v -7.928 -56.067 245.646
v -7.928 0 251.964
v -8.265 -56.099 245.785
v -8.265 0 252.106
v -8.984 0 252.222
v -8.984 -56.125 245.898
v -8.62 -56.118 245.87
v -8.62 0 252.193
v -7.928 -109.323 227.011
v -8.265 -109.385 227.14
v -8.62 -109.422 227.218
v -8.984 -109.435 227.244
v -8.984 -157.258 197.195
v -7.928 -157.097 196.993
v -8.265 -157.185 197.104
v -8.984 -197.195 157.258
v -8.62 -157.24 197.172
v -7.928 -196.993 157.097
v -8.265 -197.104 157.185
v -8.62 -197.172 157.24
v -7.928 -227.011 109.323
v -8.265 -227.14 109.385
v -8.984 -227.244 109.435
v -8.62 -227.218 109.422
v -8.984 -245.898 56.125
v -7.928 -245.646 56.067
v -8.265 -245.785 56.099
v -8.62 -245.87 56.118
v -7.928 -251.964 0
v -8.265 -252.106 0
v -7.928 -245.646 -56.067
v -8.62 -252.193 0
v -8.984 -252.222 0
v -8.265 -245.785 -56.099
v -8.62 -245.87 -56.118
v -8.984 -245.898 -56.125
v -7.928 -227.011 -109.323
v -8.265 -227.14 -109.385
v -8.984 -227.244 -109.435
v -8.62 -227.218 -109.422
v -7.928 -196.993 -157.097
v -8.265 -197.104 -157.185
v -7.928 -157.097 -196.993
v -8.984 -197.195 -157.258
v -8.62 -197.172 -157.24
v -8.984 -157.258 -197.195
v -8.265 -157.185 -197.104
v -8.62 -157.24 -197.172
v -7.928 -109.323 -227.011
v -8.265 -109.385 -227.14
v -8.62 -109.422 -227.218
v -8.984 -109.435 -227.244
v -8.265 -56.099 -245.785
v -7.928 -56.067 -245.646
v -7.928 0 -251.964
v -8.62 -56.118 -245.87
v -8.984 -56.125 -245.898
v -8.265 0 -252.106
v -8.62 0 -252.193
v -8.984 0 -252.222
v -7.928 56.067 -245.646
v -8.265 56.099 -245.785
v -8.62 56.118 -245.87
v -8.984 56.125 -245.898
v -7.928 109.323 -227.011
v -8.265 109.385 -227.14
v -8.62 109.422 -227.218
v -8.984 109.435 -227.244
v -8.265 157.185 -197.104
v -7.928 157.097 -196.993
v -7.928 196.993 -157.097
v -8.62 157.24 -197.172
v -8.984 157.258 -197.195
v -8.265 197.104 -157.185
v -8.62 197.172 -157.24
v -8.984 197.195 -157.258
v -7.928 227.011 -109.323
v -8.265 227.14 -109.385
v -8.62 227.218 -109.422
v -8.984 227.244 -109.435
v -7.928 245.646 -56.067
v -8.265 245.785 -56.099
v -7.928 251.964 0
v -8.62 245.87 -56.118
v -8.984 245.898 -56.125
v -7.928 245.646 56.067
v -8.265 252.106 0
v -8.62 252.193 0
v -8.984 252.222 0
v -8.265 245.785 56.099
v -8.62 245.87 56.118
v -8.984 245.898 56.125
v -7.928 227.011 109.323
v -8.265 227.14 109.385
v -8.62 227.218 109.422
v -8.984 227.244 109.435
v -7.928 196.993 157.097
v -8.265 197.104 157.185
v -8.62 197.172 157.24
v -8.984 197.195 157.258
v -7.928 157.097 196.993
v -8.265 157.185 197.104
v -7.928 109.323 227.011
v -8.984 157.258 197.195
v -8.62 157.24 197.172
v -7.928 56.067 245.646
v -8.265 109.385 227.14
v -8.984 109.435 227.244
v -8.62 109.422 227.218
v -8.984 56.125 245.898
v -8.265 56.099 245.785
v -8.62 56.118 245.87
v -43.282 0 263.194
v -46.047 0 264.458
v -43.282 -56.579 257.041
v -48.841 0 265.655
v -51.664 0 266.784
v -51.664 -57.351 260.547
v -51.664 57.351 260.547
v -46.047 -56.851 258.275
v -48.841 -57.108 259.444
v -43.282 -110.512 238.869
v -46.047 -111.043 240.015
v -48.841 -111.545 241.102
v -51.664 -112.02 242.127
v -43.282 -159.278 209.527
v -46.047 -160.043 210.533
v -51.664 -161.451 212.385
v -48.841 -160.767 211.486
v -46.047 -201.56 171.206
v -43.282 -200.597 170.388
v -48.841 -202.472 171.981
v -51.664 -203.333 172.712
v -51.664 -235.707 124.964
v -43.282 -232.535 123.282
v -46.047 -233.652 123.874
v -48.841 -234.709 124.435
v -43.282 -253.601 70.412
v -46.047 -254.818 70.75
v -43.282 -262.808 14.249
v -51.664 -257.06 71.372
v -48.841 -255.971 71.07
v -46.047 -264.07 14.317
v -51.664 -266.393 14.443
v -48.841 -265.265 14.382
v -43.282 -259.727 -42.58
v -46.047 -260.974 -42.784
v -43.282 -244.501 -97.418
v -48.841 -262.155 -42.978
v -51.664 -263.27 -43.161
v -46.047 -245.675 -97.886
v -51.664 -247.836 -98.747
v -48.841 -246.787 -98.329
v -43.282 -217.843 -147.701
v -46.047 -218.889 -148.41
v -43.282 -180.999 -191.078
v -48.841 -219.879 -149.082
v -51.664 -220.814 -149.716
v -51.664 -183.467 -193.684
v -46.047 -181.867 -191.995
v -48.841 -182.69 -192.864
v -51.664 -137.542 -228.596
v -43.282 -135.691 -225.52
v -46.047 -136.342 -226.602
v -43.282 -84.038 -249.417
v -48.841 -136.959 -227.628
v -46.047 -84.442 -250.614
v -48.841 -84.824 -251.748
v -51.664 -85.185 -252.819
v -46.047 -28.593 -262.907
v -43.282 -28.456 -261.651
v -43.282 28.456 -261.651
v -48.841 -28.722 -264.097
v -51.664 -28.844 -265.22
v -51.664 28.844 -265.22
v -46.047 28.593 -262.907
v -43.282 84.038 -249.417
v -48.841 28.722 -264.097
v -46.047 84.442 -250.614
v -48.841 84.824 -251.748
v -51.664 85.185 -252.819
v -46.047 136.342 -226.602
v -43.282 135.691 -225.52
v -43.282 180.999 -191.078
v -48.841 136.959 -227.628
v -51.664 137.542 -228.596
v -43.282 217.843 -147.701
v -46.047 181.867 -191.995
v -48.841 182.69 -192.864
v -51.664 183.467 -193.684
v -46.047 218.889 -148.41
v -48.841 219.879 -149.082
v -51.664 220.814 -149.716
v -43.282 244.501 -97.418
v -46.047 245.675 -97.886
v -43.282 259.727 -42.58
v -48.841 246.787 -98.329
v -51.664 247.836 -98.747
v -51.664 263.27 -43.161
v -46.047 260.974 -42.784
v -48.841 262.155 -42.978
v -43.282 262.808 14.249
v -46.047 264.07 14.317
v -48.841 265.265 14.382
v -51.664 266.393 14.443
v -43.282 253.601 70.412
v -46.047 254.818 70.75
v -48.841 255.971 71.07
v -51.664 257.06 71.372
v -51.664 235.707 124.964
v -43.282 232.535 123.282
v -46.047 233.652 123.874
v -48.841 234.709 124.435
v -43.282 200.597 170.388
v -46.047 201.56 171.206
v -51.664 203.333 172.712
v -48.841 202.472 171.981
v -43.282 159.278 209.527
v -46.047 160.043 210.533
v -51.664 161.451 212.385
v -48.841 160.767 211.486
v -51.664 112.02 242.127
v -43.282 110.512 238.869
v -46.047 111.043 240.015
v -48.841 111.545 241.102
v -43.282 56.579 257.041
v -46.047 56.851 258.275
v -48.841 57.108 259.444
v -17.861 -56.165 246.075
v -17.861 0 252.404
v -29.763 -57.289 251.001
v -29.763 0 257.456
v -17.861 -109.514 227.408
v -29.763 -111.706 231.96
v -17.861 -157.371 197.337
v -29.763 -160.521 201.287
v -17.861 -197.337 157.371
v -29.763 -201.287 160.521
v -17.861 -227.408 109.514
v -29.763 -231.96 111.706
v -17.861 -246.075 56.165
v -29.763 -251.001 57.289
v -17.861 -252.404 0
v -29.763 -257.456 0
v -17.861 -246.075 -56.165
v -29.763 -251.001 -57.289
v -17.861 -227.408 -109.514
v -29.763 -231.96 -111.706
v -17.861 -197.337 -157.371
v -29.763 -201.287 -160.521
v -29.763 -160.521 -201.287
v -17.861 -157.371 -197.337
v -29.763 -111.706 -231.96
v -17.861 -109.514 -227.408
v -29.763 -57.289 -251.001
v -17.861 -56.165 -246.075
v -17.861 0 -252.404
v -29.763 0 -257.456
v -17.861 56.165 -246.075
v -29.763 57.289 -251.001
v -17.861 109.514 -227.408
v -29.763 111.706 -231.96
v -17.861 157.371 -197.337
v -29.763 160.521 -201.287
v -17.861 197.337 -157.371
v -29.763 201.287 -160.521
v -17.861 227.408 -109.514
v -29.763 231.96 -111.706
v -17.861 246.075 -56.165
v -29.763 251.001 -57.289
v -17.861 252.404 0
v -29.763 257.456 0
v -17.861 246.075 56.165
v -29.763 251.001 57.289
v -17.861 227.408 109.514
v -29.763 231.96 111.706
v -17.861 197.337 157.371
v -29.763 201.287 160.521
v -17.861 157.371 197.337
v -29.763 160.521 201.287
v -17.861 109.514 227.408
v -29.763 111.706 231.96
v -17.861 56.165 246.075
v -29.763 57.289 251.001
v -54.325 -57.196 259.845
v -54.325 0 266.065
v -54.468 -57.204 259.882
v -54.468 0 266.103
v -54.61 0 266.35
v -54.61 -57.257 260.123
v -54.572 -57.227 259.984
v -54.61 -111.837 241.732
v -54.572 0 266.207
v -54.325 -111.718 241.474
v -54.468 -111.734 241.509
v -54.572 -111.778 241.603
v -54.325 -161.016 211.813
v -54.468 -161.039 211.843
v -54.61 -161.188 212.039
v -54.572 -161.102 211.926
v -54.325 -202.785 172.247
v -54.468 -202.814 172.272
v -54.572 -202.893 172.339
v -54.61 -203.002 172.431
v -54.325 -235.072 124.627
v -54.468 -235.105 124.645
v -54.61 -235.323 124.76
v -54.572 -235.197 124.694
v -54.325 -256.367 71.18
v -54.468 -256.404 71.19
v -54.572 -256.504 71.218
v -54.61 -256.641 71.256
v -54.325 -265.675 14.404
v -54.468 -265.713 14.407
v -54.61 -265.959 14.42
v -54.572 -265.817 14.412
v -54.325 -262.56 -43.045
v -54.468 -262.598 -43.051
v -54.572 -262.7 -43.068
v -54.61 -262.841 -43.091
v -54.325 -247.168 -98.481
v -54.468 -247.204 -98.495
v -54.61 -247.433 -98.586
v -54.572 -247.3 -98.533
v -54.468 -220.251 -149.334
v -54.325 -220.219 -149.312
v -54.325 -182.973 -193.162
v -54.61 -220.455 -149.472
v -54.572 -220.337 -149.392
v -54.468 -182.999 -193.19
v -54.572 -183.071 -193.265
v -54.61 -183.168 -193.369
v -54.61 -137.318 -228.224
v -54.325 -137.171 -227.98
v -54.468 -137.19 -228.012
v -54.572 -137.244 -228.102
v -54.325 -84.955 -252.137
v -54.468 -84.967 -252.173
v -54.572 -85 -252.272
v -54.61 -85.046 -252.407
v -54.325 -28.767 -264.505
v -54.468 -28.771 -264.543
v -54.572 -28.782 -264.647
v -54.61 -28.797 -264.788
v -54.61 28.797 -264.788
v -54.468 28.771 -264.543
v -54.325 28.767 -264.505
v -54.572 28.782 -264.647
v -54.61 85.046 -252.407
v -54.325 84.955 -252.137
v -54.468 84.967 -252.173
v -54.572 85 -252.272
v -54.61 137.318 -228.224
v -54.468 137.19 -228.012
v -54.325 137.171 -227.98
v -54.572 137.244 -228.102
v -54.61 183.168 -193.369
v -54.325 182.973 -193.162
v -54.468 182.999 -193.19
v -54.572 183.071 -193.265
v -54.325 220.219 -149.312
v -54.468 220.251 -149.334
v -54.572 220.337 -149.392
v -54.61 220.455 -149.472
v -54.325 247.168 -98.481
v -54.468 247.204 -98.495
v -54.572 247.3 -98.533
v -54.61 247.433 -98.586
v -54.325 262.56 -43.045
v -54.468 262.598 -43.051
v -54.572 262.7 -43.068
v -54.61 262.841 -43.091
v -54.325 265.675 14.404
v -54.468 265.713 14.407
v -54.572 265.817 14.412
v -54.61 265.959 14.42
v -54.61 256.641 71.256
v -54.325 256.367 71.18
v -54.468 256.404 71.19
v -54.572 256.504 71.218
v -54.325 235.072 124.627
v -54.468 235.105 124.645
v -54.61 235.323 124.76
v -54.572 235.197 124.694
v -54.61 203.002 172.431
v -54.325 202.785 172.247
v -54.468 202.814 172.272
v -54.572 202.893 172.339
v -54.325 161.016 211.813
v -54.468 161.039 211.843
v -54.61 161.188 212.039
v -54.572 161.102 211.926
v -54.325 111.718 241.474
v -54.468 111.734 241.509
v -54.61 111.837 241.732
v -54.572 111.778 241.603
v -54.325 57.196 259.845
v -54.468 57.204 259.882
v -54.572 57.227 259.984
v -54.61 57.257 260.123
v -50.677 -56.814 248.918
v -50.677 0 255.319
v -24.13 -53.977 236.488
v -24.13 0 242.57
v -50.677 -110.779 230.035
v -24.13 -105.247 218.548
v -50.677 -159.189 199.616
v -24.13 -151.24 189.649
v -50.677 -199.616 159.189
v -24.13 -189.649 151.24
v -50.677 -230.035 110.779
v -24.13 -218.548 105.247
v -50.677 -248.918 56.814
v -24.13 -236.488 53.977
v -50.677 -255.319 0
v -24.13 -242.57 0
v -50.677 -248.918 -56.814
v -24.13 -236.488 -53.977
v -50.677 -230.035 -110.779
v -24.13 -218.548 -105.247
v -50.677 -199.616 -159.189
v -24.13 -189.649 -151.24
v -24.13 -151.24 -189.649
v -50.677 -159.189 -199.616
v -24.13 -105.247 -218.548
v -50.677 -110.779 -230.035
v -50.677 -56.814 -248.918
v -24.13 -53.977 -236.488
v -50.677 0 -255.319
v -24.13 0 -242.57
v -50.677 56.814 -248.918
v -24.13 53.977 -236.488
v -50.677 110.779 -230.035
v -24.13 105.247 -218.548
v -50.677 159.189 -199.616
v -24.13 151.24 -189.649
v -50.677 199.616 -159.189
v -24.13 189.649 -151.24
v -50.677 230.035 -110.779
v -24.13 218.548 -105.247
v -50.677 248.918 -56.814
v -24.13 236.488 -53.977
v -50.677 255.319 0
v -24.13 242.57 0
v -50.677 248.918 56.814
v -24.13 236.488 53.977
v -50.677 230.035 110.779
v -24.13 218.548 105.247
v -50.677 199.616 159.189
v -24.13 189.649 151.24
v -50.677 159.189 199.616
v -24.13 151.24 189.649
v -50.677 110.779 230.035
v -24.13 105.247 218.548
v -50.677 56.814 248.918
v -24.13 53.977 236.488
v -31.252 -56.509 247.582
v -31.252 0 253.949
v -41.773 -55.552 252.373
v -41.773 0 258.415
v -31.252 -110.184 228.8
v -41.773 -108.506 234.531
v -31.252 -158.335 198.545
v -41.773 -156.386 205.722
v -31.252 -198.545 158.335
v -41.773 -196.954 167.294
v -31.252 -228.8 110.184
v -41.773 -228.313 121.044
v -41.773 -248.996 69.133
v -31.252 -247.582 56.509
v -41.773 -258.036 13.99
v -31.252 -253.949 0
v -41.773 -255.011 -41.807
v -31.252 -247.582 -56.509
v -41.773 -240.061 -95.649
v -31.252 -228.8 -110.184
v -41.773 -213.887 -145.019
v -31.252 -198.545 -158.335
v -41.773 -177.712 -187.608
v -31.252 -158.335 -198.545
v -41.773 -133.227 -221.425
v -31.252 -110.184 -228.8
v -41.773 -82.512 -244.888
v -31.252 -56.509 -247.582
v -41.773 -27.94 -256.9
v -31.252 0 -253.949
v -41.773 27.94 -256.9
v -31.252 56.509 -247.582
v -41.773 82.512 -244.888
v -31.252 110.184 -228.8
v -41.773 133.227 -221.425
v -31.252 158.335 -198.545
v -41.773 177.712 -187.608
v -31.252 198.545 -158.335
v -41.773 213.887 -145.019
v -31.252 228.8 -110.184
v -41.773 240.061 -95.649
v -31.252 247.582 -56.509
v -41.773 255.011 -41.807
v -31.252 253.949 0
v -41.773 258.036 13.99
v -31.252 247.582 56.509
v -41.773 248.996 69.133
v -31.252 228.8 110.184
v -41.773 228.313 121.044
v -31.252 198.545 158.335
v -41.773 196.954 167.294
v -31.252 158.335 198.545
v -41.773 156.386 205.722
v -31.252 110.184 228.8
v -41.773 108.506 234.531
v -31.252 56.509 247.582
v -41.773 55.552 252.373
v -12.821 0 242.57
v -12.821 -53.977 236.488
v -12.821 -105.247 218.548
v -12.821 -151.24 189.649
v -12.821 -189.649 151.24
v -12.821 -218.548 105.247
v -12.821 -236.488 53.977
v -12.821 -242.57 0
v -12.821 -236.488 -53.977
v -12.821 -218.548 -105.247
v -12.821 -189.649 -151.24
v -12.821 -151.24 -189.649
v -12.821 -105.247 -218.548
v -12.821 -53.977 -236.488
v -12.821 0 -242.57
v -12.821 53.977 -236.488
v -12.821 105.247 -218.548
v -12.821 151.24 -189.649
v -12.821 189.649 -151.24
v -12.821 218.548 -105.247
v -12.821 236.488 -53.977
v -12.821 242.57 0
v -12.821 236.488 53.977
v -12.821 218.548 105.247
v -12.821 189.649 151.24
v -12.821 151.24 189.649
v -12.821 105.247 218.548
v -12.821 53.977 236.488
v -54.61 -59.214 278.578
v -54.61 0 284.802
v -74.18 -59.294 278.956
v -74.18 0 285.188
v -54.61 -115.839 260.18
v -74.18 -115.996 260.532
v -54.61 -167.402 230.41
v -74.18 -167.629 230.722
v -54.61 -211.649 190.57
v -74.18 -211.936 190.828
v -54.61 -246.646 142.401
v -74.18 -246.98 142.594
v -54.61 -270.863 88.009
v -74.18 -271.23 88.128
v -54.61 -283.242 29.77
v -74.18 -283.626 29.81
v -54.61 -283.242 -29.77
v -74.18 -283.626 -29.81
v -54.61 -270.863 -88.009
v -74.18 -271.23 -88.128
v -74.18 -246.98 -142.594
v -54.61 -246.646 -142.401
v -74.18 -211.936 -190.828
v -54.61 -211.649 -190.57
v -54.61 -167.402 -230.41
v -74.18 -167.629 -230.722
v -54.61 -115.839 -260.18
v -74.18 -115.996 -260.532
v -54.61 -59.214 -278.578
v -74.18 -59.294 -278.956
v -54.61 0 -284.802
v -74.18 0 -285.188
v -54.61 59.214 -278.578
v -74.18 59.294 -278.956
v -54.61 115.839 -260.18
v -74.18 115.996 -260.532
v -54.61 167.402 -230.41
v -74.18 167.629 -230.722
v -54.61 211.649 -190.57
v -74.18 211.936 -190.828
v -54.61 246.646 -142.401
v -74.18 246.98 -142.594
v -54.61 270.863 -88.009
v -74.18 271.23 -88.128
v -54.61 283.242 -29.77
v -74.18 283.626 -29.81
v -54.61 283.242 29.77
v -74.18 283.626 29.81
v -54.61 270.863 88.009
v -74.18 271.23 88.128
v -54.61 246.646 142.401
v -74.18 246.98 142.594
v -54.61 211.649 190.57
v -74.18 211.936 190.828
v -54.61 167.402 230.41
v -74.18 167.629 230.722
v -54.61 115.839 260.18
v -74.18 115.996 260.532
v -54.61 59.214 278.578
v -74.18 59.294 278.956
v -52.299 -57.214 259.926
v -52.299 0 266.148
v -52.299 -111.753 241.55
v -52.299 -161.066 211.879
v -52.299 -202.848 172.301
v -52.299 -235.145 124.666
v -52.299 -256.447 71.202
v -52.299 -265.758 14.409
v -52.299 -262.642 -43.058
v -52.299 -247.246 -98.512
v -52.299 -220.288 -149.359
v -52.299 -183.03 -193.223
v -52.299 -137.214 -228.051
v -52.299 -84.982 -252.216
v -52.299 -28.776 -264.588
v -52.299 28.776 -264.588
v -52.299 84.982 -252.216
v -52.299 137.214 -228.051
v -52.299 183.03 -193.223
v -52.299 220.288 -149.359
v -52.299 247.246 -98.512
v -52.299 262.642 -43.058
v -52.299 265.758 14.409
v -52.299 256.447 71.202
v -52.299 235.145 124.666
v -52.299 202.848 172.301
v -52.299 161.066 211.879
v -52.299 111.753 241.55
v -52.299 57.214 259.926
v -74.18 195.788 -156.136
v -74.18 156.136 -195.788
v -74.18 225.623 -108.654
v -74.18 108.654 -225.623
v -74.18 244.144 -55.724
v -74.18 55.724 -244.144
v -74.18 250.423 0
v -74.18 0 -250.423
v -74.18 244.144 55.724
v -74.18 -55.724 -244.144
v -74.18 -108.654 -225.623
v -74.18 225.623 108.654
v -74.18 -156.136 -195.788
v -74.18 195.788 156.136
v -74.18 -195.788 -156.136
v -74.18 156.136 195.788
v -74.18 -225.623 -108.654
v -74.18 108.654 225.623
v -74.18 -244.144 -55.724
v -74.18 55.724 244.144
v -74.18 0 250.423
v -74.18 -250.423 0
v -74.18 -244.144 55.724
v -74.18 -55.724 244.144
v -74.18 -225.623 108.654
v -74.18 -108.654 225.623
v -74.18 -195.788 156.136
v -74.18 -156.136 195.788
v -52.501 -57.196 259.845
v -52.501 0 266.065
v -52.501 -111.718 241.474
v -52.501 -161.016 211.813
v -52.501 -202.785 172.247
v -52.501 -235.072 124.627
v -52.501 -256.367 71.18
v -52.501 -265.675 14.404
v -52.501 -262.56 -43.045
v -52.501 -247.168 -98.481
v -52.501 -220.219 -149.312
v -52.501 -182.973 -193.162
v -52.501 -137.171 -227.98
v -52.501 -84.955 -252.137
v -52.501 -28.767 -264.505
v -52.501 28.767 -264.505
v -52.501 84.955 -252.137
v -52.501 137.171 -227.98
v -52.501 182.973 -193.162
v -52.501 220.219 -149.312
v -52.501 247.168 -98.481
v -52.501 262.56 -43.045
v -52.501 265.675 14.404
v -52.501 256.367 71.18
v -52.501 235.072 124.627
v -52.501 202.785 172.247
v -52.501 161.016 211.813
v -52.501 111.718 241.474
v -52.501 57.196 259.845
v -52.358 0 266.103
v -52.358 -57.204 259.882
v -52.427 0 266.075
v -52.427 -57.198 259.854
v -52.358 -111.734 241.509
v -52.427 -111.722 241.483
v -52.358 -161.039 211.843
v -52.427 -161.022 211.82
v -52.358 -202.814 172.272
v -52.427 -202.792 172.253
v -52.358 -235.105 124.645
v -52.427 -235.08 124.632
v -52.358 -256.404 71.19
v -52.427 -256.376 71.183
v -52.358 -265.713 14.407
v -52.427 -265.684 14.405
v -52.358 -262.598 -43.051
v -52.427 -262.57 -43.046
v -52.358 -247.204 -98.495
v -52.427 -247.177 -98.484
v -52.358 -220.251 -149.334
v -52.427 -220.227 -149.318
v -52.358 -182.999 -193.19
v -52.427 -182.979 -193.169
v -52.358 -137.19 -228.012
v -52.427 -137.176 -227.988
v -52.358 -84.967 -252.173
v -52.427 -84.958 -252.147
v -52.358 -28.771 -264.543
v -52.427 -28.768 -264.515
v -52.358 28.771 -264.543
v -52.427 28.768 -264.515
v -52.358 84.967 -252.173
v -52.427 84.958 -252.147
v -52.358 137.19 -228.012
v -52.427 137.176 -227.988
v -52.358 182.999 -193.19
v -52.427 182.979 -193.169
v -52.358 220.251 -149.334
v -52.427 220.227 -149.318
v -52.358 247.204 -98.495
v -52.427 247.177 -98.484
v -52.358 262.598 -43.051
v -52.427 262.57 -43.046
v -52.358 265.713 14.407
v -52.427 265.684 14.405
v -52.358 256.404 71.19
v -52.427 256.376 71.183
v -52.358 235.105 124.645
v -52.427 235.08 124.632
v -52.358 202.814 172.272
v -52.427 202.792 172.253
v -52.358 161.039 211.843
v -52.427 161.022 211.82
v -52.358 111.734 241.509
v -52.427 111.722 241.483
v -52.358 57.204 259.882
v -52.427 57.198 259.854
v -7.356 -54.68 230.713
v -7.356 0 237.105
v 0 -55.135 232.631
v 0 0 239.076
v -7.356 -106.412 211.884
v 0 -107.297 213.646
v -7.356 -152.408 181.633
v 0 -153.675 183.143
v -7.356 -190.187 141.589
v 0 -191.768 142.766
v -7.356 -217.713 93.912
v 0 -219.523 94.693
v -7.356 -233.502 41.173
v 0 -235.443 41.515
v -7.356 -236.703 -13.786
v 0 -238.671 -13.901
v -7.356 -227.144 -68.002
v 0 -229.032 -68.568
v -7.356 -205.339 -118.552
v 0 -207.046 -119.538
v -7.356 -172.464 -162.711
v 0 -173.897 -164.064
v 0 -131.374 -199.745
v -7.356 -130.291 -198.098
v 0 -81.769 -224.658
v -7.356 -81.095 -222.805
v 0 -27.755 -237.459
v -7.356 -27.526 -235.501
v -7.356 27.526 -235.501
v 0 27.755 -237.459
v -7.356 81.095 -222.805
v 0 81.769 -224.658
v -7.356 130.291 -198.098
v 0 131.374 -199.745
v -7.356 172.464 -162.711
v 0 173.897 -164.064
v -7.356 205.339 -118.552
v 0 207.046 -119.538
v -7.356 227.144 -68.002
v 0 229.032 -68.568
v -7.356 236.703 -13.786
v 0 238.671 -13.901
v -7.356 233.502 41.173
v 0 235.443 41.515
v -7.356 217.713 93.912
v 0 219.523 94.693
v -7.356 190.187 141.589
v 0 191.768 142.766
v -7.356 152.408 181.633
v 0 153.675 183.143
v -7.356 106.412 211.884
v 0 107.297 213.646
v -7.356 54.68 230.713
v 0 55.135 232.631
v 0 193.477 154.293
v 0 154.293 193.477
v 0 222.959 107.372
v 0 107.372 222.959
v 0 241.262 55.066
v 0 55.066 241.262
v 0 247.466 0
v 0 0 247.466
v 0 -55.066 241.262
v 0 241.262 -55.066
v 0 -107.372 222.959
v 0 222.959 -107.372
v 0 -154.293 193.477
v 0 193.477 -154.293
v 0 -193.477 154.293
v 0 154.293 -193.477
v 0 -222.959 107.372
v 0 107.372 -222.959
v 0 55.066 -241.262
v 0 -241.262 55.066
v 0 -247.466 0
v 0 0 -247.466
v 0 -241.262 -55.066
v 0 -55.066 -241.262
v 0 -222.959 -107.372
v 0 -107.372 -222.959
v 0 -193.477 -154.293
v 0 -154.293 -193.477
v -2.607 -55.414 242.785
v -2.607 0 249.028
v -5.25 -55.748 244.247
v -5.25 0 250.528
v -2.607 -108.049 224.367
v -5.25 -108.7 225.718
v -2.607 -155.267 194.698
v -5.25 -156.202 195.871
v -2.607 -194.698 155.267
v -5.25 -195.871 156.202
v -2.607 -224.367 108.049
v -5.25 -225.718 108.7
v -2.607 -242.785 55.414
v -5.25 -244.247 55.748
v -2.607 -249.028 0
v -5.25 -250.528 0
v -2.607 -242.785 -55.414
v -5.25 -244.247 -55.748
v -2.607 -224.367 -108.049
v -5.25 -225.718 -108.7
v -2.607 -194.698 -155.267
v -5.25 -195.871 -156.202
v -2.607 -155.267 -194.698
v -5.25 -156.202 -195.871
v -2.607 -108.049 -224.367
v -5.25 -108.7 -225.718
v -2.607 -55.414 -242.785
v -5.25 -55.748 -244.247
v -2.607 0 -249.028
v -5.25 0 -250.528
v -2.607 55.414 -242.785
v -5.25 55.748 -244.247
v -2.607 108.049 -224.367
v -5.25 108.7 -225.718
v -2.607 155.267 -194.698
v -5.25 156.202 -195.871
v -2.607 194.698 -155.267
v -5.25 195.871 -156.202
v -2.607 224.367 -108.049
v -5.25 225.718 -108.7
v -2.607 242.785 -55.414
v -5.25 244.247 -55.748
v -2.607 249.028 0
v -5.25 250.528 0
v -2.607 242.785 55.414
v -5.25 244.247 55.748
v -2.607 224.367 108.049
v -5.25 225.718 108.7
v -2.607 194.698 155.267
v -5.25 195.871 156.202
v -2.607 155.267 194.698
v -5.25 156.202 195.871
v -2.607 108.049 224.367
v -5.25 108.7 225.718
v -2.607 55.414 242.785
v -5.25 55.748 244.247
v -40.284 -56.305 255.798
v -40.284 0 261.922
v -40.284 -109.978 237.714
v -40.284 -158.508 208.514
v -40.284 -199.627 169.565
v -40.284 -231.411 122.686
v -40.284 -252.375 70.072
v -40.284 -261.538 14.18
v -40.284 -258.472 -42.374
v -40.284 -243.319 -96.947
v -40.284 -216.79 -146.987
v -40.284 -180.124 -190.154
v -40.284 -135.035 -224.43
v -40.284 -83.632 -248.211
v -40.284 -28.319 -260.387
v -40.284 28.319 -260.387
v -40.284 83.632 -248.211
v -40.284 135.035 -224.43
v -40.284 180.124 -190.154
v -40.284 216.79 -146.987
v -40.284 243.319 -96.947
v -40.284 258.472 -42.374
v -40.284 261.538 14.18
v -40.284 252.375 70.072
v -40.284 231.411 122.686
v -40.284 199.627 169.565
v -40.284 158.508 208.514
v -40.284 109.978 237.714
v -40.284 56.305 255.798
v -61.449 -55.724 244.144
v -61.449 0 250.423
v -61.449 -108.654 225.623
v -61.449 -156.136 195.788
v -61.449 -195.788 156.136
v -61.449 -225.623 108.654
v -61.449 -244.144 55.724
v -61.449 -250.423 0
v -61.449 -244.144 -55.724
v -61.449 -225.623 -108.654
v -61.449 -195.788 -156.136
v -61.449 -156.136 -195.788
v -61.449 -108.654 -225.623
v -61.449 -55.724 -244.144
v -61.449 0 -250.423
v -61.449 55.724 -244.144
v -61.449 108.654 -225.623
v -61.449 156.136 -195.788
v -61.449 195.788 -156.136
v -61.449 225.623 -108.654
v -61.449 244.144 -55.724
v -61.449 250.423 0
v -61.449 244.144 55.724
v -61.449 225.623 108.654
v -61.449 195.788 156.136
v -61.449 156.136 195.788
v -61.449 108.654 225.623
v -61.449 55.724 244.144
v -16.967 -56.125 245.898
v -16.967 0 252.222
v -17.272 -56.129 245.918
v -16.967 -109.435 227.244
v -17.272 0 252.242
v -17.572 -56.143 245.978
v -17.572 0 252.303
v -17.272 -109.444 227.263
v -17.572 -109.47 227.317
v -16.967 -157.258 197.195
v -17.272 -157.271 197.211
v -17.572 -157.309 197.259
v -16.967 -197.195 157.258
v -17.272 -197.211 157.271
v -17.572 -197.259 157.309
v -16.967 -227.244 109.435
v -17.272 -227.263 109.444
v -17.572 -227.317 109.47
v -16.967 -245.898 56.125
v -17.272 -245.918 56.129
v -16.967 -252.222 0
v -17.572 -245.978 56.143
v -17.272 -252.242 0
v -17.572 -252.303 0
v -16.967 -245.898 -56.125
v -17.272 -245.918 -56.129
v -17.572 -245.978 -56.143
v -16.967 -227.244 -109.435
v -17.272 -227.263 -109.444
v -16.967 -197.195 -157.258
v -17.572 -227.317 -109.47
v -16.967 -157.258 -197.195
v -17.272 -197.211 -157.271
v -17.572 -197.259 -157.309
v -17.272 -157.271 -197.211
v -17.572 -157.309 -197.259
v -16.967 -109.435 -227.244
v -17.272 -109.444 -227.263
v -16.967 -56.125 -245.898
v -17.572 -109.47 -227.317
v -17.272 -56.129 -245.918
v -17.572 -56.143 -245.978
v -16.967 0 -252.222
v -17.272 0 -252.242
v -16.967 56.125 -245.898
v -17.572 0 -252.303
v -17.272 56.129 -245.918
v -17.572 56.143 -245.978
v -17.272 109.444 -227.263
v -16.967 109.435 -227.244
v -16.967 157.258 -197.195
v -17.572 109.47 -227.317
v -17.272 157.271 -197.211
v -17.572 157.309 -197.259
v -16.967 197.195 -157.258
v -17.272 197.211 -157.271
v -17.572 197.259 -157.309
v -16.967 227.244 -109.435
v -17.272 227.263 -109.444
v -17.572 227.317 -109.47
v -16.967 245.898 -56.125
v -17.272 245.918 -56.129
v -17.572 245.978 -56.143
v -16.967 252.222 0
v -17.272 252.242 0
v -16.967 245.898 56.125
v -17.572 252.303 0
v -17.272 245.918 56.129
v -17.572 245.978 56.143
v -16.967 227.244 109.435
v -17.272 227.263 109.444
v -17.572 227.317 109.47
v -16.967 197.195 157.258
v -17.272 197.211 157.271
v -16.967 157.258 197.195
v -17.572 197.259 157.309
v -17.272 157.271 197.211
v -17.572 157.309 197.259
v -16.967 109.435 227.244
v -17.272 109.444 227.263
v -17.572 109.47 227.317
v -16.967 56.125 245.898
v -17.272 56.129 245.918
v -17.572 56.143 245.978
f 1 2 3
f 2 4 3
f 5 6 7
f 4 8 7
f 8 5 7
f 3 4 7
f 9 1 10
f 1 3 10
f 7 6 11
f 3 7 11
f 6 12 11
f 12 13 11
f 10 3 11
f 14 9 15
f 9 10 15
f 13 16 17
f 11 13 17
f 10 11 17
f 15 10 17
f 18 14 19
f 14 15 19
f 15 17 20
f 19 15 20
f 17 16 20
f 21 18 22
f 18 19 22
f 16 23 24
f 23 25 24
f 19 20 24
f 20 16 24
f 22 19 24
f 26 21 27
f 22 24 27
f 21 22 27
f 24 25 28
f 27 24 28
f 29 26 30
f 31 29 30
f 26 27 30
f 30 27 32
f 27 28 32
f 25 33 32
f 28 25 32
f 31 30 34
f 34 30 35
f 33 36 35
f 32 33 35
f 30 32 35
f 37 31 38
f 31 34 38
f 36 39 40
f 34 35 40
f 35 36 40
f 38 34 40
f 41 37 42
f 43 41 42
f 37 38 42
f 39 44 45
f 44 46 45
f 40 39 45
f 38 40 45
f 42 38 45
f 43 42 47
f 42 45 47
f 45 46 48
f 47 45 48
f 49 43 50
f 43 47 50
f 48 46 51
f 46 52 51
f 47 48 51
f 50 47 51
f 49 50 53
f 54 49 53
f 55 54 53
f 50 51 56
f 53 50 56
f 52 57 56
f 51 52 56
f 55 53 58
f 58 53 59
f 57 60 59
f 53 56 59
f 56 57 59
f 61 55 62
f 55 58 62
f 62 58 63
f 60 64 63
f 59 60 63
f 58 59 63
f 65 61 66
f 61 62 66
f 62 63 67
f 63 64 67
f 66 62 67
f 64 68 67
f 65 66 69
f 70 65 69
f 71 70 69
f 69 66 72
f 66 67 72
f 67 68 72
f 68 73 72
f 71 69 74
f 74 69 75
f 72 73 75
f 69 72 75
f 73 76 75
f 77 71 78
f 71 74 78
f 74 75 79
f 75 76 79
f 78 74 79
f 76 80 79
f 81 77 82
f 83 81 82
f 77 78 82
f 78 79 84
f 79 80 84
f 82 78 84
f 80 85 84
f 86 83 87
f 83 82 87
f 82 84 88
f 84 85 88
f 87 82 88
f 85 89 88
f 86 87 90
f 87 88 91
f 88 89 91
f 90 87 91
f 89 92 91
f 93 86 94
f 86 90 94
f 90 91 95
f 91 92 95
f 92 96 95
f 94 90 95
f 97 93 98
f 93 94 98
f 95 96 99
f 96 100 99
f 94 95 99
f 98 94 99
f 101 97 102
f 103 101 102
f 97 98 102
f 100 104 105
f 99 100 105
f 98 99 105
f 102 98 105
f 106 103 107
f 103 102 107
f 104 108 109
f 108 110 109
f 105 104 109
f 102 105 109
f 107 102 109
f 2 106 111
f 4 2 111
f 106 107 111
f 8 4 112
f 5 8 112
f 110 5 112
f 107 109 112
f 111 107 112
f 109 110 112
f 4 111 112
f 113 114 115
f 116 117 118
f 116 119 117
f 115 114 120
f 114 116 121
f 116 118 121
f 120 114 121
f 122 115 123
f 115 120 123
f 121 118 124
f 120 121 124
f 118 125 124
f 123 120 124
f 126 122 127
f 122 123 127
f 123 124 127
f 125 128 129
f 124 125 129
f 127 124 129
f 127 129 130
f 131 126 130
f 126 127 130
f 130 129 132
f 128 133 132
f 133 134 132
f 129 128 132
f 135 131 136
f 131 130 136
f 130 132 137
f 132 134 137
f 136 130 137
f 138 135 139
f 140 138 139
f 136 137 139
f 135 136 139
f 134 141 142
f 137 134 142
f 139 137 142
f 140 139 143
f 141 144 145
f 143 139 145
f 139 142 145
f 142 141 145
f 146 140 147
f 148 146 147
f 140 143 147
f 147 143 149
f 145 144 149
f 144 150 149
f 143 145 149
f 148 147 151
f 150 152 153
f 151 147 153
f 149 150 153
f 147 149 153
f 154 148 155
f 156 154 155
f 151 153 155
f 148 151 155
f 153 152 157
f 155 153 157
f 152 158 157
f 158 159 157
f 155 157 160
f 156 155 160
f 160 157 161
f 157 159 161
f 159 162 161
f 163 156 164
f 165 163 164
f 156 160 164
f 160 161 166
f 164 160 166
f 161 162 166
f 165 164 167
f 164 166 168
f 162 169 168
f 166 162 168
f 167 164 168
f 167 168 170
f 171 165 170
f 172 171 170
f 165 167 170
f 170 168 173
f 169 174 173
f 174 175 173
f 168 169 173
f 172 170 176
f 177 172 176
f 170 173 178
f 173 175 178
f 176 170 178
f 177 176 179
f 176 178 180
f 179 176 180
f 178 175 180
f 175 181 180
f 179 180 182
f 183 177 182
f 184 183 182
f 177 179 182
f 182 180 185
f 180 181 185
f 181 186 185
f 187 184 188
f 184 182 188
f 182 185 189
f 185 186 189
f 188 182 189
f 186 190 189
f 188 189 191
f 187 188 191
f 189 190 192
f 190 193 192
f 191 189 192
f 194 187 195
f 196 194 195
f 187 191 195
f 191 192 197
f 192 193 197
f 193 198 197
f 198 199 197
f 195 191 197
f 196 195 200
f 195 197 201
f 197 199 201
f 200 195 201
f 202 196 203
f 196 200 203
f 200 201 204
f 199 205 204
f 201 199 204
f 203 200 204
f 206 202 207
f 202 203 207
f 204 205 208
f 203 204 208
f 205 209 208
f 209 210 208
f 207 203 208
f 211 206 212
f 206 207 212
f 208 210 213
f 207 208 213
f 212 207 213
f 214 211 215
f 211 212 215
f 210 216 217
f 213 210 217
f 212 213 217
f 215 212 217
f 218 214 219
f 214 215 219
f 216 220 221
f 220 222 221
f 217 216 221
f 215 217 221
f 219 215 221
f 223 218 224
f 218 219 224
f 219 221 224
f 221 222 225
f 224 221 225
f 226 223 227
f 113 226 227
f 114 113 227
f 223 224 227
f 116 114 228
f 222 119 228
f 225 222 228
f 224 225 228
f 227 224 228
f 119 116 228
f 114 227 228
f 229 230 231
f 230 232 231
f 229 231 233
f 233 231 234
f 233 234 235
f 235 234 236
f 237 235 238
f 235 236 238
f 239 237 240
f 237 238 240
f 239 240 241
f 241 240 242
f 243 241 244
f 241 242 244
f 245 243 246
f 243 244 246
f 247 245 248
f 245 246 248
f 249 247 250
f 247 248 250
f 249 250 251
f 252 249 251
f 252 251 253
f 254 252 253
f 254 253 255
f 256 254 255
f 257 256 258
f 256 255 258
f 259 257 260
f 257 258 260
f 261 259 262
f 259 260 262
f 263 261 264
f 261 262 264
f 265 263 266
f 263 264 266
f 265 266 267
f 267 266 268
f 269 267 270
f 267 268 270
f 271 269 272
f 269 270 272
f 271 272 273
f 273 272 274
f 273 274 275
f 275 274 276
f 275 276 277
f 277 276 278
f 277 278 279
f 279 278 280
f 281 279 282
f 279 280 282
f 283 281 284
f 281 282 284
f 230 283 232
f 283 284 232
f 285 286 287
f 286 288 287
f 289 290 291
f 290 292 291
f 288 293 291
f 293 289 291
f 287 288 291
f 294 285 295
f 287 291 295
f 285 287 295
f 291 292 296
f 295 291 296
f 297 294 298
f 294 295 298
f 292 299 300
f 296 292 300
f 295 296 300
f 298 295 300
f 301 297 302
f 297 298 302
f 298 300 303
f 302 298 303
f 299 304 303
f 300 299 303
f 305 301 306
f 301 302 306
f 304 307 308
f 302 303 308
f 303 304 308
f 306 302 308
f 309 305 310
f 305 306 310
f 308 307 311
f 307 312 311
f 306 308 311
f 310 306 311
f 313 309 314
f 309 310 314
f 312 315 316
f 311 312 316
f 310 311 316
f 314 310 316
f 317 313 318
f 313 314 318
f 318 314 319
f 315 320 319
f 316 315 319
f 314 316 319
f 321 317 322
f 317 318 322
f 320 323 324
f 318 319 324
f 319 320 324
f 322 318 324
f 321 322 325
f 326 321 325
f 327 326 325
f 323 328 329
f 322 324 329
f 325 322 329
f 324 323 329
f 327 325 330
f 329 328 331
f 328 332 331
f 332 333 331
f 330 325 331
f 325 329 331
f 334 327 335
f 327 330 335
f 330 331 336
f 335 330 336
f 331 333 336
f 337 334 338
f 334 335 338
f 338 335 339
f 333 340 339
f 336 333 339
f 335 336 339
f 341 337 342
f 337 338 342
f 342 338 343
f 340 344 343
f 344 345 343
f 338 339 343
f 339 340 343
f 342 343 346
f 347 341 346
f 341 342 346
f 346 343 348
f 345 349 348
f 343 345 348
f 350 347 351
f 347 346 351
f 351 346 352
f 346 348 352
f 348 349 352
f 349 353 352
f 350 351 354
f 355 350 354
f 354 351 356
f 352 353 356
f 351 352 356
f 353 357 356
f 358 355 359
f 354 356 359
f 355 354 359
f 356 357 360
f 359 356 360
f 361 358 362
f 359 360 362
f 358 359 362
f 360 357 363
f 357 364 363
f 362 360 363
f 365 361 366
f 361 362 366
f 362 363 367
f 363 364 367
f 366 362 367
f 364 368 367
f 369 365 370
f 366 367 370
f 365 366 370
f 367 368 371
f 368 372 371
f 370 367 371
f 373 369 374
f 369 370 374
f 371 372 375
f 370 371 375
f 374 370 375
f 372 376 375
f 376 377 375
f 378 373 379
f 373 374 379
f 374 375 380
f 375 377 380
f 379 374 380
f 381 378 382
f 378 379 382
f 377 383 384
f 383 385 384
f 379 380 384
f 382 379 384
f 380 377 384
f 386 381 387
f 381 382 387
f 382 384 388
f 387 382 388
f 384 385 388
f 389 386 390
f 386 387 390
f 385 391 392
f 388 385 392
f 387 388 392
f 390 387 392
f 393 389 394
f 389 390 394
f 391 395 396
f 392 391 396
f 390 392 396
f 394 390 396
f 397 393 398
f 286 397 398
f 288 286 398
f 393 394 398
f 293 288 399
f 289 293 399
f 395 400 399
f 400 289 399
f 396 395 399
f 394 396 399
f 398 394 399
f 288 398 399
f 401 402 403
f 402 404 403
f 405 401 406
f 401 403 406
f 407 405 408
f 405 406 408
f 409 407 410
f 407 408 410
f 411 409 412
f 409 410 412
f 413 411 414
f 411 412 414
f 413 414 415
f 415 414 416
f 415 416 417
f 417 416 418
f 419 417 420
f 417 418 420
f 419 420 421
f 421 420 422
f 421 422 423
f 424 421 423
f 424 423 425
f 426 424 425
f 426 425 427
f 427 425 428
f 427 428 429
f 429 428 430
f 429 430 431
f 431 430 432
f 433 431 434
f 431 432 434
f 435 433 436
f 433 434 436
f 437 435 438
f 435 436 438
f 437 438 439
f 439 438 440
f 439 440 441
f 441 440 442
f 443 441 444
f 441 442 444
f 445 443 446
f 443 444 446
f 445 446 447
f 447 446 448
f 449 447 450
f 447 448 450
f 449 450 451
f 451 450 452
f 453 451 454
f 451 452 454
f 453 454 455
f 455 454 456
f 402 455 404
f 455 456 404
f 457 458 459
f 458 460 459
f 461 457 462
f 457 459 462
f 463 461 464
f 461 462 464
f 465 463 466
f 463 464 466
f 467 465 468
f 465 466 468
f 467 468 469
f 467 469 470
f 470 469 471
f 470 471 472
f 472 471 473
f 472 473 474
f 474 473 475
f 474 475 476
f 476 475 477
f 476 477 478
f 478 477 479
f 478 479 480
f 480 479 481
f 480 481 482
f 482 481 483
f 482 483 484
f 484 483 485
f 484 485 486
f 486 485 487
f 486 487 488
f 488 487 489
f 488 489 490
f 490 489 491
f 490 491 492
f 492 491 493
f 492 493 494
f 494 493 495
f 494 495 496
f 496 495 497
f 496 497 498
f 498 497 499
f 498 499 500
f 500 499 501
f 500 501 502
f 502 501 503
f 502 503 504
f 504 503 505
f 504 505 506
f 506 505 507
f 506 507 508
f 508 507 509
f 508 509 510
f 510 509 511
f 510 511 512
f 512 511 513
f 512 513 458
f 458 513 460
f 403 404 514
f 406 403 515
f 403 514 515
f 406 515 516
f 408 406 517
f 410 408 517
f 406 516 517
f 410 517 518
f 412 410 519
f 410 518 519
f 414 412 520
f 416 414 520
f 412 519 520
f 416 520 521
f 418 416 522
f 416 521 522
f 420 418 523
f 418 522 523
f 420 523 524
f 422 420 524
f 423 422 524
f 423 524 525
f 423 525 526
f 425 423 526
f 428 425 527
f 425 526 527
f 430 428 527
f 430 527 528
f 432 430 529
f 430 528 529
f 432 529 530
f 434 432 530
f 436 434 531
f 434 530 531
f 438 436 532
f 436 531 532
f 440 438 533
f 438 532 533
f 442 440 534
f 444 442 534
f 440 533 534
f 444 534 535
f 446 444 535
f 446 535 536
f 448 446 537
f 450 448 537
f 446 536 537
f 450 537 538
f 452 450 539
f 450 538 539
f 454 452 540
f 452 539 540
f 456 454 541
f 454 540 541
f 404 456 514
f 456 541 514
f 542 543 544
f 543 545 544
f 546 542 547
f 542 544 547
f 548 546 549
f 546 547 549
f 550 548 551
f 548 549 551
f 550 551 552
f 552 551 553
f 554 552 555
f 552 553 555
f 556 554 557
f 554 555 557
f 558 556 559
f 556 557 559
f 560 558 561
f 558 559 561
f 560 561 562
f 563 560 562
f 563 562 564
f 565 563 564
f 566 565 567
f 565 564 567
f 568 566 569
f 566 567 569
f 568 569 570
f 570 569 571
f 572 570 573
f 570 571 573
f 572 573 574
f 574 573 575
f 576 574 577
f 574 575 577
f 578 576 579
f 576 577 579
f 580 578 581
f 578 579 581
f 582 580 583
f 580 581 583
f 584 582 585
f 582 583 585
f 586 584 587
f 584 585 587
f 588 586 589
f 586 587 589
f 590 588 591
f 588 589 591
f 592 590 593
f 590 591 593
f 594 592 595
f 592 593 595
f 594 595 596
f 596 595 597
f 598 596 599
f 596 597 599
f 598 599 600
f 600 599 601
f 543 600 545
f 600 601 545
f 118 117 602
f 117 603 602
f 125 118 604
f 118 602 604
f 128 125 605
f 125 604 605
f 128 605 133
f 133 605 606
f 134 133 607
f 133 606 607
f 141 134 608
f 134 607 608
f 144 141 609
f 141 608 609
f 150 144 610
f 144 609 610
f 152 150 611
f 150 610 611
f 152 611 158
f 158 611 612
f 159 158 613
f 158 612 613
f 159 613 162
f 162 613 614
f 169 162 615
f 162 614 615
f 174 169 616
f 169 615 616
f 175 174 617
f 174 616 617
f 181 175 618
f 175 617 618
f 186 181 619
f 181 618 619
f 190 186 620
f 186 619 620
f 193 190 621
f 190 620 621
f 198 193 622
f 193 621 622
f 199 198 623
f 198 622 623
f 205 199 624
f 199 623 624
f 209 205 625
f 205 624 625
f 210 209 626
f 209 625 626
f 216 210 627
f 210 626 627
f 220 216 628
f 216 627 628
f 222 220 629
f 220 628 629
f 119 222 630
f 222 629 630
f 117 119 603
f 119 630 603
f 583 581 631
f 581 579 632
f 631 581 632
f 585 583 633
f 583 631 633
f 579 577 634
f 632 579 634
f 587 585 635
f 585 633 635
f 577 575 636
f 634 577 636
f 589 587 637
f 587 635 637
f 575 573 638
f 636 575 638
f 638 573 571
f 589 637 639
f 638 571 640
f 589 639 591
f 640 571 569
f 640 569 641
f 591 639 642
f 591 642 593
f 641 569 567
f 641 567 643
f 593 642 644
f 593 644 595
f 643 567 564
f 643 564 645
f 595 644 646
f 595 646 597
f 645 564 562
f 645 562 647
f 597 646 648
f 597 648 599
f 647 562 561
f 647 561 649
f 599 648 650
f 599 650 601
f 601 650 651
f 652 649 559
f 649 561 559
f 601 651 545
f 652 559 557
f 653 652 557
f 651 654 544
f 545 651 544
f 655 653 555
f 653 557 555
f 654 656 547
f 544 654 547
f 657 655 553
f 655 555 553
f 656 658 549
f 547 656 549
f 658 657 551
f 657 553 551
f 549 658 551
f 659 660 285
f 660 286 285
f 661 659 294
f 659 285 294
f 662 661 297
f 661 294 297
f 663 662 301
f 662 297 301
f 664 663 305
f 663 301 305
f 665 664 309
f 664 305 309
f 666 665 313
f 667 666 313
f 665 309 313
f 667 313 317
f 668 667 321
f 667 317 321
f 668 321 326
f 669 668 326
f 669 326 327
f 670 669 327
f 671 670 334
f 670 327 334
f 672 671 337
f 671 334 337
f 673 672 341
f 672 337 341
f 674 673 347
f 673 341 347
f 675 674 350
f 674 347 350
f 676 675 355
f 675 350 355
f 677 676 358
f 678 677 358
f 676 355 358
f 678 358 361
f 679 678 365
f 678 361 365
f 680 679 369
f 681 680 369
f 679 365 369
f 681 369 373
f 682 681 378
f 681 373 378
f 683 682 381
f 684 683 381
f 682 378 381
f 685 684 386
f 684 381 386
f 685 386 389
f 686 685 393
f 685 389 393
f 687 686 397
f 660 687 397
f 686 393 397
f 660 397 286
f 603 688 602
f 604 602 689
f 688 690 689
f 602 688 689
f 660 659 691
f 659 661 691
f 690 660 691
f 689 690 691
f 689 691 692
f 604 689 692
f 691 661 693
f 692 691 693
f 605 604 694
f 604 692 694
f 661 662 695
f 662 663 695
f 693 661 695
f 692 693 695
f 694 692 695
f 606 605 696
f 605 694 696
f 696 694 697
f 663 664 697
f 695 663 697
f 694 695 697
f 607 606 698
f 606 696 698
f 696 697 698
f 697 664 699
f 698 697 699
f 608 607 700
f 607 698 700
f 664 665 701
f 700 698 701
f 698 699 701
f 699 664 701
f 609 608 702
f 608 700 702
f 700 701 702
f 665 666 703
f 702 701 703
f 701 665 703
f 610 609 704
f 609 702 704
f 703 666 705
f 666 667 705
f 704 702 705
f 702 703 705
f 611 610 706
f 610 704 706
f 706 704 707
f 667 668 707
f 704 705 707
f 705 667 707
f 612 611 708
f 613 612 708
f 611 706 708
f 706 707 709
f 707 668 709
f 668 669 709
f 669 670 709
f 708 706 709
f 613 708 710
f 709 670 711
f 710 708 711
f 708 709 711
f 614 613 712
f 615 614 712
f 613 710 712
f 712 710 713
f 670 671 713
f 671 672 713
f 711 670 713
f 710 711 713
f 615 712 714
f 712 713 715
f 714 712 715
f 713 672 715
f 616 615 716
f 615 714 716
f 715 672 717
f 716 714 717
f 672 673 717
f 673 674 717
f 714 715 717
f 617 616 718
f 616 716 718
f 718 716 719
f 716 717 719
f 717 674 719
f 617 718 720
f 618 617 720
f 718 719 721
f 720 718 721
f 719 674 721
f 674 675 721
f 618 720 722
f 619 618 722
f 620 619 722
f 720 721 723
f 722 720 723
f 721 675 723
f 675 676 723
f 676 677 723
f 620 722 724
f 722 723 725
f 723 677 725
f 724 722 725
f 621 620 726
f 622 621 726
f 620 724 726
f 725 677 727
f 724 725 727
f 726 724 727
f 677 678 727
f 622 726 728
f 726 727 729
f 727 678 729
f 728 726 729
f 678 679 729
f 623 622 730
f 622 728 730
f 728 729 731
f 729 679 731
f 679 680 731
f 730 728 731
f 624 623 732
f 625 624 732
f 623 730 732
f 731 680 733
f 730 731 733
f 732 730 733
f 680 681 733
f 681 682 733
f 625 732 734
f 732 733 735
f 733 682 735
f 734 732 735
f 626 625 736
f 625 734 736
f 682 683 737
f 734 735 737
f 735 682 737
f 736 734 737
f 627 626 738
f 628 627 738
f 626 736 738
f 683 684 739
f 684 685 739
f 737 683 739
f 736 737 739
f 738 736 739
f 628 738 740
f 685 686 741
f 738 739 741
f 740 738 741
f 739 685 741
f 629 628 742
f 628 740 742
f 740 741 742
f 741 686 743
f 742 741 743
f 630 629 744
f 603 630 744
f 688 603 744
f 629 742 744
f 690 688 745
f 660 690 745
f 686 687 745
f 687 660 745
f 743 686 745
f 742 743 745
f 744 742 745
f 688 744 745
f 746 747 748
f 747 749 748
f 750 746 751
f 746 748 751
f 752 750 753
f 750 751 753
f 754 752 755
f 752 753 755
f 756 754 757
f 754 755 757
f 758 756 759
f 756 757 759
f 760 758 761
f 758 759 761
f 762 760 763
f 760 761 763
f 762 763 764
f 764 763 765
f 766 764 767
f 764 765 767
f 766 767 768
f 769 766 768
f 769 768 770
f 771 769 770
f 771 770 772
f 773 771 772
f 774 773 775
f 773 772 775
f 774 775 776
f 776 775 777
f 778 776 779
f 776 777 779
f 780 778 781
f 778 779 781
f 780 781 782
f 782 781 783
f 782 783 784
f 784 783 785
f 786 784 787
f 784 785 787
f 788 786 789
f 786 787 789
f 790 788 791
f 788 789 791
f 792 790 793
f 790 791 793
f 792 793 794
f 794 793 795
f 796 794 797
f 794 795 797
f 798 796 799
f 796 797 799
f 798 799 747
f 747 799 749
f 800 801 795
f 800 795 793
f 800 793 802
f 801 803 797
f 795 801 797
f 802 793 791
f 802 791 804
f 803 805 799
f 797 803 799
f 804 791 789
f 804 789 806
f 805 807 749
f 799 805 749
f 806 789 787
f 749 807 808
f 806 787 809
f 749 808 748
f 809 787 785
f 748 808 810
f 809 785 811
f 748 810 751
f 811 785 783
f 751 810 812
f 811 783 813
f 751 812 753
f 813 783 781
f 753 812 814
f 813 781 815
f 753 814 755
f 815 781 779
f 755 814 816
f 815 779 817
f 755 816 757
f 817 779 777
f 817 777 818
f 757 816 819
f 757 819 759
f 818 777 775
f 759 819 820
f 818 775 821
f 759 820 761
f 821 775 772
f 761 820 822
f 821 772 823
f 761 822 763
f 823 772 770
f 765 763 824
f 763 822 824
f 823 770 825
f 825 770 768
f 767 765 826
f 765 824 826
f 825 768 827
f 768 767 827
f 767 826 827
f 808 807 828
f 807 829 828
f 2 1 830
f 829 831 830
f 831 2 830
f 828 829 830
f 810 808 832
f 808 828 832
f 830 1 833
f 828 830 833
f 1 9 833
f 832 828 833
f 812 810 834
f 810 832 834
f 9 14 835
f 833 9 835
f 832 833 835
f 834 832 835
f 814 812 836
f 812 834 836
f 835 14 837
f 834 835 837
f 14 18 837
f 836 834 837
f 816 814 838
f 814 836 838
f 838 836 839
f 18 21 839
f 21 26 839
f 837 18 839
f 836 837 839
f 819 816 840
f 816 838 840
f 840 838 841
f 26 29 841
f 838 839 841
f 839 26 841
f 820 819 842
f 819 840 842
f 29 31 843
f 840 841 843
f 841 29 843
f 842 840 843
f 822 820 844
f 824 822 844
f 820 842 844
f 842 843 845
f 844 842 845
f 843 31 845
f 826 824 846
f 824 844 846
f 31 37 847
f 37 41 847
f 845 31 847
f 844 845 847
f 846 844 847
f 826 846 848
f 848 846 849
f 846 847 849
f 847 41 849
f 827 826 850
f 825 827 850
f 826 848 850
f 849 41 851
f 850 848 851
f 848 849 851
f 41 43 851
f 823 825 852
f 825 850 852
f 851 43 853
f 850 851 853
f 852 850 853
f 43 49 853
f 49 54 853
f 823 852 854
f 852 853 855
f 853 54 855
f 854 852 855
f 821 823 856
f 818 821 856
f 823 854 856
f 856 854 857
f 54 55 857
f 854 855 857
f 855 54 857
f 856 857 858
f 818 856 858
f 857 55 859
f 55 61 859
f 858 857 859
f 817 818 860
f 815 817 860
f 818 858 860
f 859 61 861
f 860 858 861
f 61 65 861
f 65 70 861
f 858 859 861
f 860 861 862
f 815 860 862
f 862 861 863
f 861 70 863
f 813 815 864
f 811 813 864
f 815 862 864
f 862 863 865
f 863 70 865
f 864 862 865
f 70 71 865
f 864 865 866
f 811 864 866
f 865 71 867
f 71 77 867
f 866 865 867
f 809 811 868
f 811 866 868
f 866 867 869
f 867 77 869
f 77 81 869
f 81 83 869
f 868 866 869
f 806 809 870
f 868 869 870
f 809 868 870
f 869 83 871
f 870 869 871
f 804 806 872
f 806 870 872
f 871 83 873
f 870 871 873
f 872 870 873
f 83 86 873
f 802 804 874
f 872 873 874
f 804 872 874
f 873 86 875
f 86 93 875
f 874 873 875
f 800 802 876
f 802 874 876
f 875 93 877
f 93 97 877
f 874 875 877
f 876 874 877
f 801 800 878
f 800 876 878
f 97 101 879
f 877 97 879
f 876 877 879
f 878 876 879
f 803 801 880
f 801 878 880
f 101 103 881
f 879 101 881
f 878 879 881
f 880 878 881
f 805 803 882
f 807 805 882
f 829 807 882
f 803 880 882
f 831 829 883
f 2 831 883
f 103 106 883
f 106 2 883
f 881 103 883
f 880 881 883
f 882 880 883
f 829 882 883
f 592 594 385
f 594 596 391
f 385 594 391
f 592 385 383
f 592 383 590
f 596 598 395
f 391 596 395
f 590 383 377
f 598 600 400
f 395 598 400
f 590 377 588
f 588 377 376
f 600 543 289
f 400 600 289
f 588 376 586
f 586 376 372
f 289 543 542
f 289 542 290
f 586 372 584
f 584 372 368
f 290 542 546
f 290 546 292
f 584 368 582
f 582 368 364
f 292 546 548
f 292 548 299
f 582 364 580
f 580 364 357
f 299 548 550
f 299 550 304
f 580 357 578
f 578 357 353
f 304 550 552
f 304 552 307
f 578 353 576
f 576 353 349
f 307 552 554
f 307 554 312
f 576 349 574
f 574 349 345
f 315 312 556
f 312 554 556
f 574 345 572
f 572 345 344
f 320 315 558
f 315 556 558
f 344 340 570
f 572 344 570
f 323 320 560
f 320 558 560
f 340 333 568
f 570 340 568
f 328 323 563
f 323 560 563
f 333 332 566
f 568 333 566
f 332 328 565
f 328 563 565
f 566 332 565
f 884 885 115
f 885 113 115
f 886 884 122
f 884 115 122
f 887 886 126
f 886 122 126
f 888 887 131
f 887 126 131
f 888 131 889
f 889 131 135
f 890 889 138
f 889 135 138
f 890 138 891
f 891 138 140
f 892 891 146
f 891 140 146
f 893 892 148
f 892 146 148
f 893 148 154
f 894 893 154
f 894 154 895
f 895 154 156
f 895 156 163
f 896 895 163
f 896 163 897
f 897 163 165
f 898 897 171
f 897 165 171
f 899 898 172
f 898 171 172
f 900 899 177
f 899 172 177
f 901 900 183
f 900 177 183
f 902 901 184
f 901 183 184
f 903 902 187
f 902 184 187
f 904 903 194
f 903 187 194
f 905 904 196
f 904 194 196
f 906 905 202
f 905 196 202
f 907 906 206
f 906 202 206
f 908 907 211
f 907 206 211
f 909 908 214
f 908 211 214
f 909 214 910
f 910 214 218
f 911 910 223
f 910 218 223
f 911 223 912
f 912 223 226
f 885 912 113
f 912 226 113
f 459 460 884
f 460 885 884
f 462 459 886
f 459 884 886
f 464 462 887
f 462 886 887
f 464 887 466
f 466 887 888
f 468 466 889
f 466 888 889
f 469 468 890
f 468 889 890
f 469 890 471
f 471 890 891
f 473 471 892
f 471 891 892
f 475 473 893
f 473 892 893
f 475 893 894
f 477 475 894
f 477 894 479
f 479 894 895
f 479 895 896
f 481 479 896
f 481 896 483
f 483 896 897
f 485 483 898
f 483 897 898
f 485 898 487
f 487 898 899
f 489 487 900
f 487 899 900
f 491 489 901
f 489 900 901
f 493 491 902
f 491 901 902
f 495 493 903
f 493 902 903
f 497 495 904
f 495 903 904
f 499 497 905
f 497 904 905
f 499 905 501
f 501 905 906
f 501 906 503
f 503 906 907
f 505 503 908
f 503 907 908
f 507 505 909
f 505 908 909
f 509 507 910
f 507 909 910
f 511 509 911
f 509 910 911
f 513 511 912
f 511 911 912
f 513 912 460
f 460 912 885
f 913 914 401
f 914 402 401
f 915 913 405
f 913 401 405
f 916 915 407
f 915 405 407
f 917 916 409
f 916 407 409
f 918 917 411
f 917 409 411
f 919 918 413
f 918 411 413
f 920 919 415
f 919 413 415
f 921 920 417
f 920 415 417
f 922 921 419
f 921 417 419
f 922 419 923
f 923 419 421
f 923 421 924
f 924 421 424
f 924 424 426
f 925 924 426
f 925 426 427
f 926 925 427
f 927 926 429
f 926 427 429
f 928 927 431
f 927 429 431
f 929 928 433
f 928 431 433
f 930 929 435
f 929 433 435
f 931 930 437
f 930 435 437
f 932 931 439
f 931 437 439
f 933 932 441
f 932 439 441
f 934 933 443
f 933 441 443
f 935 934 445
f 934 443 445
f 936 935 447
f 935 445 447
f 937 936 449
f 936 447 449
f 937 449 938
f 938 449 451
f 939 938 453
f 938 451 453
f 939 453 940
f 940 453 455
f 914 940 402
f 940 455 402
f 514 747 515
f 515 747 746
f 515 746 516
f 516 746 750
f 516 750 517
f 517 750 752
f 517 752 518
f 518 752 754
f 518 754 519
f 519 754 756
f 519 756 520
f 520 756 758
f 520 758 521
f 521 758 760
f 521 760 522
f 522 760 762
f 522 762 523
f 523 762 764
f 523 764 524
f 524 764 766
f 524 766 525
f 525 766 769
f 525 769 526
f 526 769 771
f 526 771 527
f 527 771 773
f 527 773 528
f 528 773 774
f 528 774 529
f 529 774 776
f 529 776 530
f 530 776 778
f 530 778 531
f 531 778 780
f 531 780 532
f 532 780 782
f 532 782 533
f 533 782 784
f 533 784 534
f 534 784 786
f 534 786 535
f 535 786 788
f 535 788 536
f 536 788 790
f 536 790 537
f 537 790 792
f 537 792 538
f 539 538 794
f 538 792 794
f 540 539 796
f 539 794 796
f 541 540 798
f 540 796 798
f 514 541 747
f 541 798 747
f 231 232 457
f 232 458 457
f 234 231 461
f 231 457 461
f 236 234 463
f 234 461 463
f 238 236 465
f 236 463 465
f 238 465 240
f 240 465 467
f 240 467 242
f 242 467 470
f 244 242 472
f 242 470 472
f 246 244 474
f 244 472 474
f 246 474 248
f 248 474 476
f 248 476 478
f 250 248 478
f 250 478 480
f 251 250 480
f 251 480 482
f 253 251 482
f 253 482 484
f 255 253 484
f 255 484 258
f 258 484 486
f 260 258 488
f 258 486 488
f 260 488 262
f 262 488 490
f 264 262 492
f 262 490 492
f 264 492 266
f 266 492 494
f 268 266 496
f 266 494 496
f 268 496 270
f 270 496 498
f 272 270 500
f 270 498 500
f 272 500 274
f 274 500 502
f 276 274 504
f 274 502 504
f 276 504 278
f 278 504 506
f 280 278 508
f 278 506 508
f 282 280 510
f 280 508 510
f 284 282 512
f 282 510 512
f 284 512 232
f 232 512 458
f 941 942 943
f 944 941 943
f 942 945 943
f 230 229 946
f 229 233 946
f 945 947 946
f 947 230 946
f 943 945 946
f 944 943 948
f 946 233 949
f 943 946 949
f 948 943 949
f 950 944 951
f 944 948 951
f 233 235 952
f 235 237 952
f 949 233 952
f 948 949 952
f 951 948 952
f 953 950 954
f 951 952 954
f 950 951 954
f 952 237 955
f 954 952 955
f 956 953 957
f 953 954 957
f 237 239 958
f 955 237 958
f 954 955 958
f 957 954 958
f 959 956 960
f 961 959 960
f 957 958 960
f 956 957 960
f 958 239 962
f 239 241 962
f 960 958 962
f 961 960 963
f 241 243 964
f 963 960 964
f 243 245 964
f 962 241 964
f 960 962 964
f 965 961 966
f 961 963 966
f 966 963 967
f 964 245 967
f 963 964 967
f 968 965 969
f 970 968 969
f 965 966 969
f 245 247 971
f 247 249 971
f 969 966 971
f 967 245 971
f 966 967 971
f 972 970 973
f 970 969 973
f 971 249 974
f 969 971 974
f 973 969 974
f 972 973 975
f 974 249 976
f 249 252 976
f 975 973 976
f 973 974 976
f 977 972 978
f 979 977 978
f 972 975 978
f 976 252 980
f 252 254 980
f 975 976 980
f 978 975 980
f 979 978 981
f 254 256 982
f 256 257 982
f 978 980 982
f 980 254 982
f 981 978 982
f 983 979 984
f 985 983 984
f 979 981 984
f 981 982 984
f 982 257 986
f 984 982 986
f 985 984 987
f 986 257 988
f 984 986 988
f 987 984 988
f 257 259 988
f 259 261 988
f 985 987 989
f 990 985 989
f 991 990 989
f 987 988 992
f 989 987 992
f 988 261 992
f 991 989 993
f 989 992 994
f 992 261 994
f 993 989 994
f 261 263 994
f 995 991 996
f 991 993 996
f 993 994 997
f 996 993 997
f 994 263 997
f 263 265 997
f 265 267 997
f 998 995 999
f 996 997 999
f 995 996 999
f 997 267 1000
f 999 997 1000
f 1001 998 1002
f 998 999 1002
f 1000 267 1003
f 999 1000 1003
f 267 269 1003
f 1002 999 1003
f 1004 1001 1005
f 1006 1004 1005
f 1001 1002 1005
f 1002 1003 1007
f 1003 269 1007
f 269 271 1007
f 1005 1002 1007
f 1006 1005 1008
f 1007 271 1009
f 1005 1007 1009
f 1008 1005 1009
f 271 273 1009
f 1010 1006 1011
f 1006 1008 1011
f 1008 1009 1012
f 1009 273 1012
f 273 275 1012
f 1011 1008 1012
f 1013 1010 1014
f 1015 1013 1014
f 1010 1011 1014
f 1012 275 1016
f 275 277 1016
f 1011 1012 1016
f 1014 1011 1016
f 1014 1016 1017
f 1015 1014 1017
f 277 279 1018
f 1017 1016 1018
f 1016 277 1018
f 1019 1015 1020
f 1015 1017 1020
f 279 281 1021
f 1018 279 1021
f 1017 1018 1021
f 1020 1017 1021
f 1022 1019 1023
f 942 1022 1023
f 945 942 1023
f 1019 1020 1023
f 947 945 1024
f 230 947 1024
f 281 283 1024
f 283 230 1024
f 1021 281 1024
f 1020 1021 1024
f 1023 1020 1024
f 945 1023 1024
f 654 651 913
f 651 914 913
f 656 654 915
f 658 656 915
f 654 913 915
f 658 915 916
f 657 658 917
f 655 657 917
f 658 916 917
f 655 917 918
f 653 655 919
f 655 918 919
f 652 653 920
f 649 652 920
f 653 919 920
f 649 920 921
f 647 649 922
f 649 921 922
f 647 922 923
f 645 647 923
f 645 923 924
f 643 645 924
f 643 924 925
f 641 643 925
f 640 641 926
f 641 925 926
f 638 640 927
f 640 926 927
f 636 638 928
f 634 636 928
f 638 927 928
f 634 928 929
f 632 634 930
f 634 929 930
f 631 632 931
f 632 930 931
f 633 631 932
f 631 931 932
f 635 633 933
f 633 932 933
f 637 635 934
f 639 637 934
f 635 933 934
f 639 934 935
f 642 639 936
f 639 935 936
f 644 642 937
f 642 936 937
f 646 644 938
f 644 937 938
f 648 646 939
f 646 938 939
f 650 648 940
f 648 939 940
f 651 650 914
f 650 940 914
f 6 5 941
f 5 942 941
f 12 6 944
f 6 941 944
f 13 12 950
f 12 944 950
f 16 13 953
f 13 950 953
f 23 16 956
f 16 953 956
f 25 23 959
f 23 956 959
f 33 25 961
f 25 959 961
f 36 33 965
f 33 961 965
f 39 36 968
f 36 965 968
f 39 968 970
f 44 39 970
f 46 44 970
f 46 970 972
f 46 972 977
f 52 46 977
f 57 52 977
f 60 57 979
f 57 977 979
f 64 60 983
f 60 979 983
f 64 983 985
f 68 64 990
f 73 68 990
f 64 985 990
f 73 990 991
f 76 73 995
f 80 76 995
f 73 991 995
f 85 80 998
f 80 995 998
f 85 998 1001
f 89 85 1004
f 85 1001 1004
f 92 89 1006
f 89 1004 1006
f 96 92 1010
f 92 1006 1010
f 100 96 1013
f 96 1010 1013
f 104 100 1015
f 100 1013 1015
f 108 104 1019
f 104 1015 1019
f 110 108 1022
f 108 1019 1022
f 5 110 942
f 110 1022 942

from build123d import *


with BuildPart() as f1:
    # F0 (on Front) → F1 (revolve)
    with BuildSketch(Plane.XZ):
        with BuildLine():
            Line((-12.820962, 242.57), (-7.355597, 237.104635))
            Line((-7.355597, 237.104635), (0, 239.075561))
            Line((0, 239.075561), (0, 240.829671))
            Line((0, 240.829671), (0, 245.209498))
            Line((0, 245.209498), (0, 246.18163))
            Line((0, 246.18163), (0, 247.46631))
            ThreePointArc((0, 247.46631), (-3.923627, 249.786079), (-7.92797, 251.963556))
            ThreePointArc((-7.92797, 251.963556), (-8.440309, 252.156449), (-8.983817, 252.222))
            Line((-8.983817, 252.222), (-16.967452, 252.222))
            ThreePointArc((-16.967452, 252.222), (-17.423207, 252.267892), (-17.860664, 252.403726))
            Line((-17.860664, 252.403726), (-29.76303, 257.45598))
            Line((-29.76303, 257.45598), (-31.251715, 253.948857))
            Line((-31.251715, 253.948857), (-41.773086, 258.414914))
            Line((-41.773086, 258.414914), (-40.2844, 261.922037))
            Line((-40.2844, 261.922037), (-43.2816, 263.194273))
            ThreePointArc((-43.2816, 263.194273), (-47.440371, 265.06445), (-51.6636, 266.784125))
            Line((-51.6636, 266.784125), (-52.299364, 266.148361))
            ThreePointArc((-52.299364, 266.148361), (-52.391699, 266.086665), (-52.500615, 266.065))
            Line((-52.500615, 266.065), (-54.325387, 266.065))
            ThreePointArc((-54.325387, 266.065), (-54.526639, 266.148361), (-54.61, 266.349613))
            Line((-54.61, 266.349613), (-54.61, 284.802049))
            Line((-54.61, 284.802049), (-74.180059, 285.188049))
            Line((-74.180059, 285.188049), (-74.180059, 250.422508))
            Line((-74.180059, 250.422508), (-61.449014, 250.422508))
            Line((-61.449014, 250.422508), (-50.676592, 255.319059))
            Line((-50.676592, 255.319059), (-24.13, 242.57))
            Line((-24.13, 242.57), (-13.944356, 242.57))
            Line((-13.944356, 242.57), (-12.820962, 242.57))
        make_face()
    revolve(axis=Axis((15.058352, 0, 0), (1, 0, 0)))


solid = f1.part
